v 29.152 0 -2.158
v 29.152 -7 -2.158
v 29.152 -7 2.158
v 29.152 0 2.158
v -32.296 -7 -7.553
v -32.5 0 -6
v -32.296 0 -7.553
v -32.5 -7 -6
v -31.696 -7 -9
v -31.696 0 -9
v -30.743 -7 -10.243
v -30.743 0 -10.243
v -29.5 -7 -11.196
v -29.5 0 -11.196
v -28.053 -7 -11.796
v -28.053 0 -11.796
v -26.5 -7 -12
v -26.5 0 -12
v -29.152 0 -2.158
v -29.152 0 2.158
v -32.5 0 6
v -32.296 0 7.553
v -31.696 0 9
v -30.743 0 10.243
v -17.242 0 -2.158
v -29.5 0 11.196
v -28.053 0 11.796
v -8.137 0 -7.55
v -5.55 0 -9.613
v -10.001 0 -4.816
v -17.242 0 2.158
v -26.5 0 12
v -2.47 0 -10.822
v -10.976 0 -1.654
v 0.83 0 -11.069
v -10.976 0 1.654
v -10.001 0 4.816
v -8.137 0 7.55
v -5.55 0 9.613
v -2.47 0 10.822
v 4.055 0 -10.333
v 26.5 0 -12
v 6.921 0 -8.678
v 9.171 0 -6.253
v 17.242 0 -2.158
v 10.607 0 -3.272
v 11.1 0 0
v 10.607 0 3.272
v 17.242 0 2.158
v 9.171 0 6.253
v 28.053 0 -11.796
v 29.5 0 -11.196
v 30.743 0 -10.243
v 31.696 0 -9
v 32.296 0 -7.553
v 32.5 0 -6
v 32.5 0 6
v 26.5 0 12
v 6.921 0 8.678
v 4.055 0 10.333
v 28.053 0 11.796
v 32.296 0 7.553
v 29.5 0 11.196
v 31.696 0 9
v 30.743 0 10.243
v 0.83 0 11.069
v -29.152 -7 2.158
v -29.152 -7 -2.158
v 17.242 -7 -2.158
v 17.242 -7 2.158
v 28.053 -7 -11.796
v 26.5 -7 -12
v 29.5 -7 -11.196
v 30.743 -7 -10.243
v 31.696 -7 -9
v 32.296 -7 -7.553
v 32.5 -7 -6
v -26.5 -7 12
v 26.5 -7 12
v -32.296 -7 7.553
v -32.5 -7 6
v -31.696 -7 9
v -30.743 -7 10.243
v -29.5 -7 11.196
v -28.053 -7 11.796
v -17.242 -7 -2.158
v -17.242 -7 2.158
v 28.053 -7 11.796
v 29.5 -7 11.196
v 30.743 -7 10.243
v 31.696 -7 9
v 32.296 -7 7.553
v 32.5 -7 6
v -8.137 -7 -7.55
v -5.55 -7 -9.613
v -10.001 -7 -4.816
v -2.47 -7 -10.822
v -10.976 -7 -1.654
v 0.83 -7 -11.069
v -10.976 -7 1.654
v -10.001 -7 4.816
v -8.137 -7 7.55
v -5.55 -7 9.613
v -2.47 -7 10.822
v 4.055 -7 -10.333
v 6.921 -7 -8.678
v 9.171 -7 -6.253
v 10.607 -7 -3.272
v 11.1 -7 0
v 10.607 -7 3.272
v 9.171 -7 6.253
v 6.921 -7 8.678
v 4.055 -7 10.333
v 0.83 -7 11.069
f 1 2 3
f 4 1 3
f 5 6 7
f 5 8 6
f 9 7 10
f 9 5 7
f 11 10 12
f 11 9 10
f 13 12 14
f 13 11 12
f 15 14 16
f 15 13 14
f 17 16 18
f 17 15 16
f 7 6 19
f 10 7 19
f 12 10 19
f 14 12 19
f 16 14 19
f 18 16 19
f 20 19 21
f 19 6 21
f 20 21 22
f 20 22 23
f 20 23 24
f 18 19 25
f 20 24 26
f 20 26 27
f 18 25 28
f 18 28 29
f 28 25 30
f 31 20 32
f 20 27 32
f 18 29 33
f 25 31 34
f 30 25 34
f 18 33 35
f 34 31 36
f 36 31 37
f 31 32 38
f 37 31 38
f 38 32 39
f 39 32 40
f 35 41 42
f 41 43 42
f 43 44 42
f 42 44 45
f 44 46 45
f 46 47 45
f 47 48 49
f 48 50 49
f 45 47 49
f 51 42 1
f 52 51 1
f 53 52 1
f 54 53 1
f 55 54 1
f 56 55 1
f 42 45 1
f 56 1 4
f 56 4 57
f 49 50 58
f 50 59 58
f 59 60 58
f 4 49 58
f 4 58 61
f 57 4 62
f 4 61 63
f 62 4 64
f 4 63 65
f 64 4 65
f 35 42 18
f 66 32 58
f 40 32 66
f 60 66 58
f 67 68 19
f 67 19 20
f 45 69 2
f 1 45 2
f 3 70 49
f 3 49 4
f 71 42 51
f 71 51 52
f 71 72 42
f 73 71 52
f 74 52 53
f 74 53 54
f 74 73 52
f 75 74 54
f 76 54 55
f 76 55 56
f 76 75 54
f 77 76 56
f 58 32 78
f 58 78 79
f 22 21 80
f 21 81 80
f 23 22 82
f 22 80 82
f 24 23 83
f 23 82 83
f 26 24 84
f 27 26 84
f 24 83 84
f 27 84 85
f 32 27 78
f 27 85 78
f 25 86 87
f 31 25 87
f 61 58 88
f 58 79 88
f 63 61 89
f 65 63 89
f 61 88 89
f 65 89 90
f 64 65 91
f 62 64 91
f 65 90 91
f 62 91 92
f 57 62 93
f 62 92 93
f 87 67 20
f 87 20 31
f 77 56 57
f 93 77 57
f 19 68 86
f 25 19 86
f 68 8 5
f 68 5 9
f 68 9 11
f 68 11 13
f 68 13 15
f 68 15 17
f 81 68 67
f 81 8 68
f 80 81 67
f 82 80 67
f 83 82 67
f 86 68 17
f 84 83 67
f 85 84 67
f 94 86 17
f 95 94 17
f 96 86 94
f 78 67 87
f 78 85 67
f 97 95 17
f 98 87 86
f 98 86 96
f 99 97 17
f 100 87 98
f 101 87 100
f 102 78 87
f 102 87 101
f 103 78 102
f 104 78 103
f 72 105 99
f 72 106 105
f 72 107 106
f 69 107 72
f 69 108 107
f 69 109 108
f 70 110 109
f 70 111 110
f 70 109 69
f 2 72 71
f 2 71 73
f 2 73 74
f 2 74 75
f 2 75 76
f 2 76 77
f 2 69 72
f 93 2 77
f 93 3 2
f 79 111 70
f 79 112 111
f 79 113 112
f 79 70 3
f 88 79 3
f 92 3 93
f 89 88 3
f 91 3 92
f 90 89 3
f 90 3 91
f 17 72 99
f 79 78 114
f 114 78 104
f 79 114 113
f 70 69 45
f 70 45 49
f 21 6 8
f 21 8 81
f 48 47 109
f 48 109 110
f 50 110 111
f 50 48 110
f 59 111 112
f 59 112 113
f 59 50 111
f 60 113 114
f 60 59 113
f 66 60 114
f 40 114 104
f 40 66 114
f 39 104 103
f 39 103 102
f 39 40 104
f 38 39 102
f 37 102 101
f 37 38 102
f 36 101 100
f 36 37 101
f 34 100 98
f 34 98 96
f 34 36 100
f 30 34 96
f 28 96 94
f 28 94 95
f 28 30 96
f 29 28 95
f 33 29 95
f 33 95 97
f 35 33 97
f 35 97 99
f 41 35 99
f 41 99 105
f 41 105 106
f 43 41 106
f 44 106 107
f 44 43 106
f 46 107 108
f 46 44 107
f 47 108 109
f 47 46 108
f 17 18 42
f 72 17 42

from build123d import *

# Parameters (mm, degrees)
F0_W     = 65
F0_H     = 24
F0_R     = 11.1
F1_DEPTH = 7
F2_R     = 6
F3_W     = 11.910181
F3_H     = 4.31511
F4_DEPTH = 7.001


with BuildPart() as f1:
    # F0 (on Front) → F1 (new body)
    with BuildSketch(Plane.XZ):
        Rectangle(F0_W, F0_H)
        Circle(F0_R, mode=Mode.SUBTRACT)
    extrude(amount=F1_DEPTH)

    # F2
    f2_edges = [f1.edges().sort_by_distance(p)[0] for p in [
        (-32.5, -3.5, 12),
        (-32.5, -3.5, -12),
        (32.5, -3.5, -12),
        (32.5, -3.5, 12),
    ]]
    fillet(f2_edges, radius=F2_R)

    # F3 (on face) → F4 (cut, through all)
    with BuildSketch(Plane.XZ.offset(7)):
        with Locations((-23.196599, 0)):
            Rectangle(F3_W, F3_H)
        with Locations((23.196599, 0)):
            Rectangle(F3_W, F3_H)
    extrude(amount=-F4_DEPTH, mode=Mode.SUBTRACT)


solid = f1.part
